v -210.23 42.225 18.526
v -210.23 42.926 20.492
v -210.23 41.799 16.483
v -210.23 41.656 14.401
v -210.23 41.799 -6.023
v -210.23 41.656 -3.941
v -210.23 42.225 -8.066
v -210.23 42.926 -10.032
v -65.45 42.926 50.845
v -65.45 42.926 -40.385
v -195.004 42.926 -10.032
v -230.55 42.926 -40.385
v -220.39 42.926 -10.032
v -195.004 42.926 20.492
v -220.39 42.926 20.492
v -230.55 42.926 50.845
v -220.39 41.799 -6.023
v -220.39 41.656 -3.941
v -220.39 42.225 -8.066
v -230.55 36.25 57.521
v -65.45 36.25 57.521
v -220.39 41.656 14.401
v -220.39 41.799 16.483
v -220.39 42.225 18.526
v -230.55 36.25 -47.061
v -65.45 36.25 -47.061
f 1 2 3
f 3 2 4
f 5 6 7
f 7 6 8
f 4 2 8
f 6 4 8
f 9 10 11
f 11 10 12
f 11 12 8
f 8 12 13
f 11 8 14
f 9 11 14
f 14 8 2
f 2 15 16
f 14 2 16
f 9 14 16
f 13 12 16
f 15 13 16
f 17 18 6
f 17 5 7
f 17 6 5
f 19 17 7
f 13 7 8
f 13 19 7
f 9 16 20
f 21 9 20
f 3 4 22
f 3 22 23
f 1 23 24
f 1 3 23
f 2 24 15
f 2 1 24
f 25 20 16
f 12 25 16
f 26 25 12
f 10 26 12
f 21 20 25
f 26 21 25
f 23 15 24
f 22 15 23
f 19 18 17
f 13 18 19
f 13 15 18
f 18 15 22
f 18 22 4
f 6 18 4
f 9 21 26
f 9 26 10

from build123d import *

# Parameters (mm, degrees)
NRG_PSU_CASE_1_START = -230.550293706
NRG_PSU_CASE_1_DEPTH = 165.1
SKETCH2_W            = 10.16
SKETCH2_H            = 30.52357951
CUT_EXTRUDE1_DEPTH   = 1.27
FILLET1_R            = 15.24


# Read off the part's stored shape, not the designer's step: -NRG_PSU_CASE-1
with BuildPart() as part:
    # -NRG_PSU_CASE-1 outline → -NRG_PSU_CASE-1 (new body)
    with BuildSketch(Plane.YZ.offset(NRG_PSU_CASE_1_START)):
        Polygon((42.926, 50.844880664), (36.249795103, 57.521085561), (36.249795103, -47.060903743), (42.926, -40.384698846), align=None)
    extrude(amount=NRG_PSU_CASE_1_DEPTH)

    # Sketch2 → Cut-Extrude1 (cut)
    with BuildSketch(Plane(origin=(0, 42.926, 0), x_dir=(1, 0, 0), z_dir=(0, 1, 0))):
        with Locations((-215.310293706, -5.230090909)):
            Rectangle(SKETCH2_W, SKETCH2_H)
    extrude(amount=-CUT_EXTRUDE1_DEPTH, mode=Mode.SUBTRACT)

    # Fillet1
    # the kernel refuses this fillet: 15.24 mm, written as the material it adds along each edge
    with BuildSketch(Plane(origin=(-195.00352862, 41.656, 20.491880664), x_dir=(0, 1, 0), z_dir=(-1, 0, 0)), Plane(origin=(-220.390293706, 41.656, -10.031698846), x_dir=(0, 1, 0), z_dir=(1, 0, 0))) as fillet1_piece_1:
        with BuildLine():
            CenterArc((15.24, 6.090706035), FILLET1_R, 180, 23.556464309)
            Line((0, 6.090706035), (0, 0))
            Line((0, 0), (1.27, 0))
        make_face()
    extrude(amount=25.386765087)


solid = part.part
